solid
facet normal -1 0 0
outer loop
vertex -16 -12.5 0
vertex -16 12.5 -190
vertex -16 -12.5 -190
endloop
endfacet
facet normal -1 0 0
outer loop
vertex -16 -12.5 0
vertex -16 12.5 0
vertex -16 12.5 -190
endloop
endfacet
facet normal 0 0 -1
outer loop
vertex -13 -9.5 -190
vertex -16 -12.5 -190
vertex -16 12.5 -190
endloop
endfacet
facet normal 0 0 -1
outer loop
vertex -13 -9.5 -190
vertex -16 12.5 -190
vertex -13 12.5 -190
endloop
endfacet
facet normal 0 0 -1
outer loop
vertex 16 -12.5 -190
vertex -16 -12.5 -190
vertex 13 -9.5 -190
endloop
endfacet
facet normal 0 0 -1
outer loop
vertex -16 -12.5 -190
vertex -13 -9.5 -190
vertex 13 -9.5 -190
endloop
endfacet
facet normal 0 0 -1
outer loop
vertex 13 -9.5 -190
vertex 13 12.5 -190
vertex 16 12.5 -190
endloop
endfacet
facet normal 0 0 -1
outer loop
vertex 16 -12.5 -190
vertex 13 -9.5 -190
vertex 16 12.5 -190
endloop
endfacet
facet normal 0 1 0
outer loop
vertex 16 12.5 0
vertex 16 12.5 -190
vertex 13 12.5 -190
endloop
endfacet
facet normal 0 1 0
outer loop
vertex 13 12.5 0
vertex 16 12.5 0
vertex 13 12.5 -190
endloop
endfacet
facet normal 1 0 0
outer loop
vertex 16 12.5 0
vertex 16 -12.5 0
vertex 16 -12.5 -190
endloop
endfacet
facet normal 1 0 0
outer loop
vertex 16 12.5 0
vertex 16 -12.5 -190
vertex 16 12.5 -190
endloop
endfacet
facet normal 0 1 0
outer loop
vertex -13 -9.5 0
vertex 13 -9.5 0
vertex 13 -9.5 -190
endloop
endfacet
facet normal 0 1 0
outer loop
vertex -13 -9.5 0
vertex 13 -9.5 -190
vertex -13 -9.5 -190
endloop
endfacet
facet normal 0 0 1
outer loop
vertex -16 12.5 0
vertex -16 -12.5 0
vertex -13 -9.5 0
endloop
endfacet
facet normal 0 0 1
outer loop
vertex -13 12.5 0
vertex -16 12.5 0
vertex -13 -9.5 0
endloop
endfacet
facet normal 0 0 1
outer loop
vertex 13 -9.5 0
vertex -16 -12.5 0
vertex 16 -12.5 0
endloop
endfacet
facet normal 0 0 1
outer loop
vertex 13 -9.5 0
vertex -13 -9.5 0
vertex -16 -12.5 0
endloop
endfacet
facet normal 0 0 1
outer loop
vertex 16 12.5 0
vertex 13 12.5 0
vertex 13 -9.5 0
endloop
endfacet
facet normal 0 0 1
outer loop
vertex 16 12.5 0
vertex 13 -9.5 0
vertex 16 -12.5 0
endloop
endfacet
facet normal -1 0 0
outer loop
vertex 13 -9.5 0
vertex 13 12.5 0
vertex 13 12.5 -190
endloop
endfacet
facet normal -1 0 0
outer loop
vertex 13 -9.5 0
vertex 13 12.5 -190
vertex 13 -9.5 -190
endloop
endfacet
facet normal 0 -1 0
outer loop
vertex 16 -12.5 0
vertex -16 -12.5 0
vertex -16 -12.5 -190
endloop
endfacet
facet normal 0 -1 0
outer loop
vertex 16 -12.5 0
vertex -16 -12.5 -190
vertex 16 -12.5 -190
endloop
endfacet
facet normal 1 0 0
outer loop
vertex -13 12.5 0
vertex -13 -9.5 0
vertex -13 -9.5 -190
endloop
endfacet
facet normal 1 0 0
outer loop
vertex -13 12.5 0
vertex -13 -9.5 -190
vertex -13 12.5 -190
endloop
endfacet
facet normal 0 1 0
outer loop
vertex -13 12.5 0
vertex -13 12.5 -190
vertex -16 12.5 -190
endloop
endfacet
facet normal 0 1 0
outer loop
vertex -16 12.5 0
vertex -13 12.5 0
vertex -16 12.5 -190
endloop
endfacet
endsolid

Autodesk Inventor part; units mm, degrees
ref_plane "YZ Plane" through (0, 0, 0) normal (1, 0, 0) x (0, 1, 0)
ref_plane "XZ Plane" through (0, 0, 0) normal (0, 1, 0) x (-1, 0, 0)
ref_plane "XY Plane" through (0, 0, 0) normal (0, 0, 1) x (1, 0, 0)
sketch "Sketch1" plane through (0, 0, 0) normal (0, 0, 1) x (1, 0, 0)
  line L0 (-16, -12.5) -> (16, -12.5)
  line L1 (16, -12.5) -> (16, 12.5)
  line L2 (16, 12.5) -> (13, 12.5)
  line L3 (13, 12.5) -> (13, -9.5)
  line L4 (13, -9.5) -> (-13, -9.5)
  line L5 (-13, -9.5) -> (-13, 12.5)
  line L6 (-13, 12.5) -> (-16, 12.5)
  line L7 (-16, 12.5) -> (-16, -12.5)
  point P0 (0, 0)
  dimension "d0" = 32
  dimension "d1" = 25
  dimension "d2" = 3
  dimension "d3" = 90
  dimension "d4" = 22
  dimension "d5" = 26
  dimension "d6" = 22
  dimension "d7" = 3
  dimension "d8" = 25
  dimension "d10" = 12.5
  dimension "d11" = 16
extrude "Extrusion1" add sketch "Sketch1" against normal blind 190
equation "\"d5\" = d0 - 2 * d7"
equation "\"d10\" = 0.5 * d1"
equation "\"d11\" = 0.5 * d0"
properties part number "Chassis Vertical"
